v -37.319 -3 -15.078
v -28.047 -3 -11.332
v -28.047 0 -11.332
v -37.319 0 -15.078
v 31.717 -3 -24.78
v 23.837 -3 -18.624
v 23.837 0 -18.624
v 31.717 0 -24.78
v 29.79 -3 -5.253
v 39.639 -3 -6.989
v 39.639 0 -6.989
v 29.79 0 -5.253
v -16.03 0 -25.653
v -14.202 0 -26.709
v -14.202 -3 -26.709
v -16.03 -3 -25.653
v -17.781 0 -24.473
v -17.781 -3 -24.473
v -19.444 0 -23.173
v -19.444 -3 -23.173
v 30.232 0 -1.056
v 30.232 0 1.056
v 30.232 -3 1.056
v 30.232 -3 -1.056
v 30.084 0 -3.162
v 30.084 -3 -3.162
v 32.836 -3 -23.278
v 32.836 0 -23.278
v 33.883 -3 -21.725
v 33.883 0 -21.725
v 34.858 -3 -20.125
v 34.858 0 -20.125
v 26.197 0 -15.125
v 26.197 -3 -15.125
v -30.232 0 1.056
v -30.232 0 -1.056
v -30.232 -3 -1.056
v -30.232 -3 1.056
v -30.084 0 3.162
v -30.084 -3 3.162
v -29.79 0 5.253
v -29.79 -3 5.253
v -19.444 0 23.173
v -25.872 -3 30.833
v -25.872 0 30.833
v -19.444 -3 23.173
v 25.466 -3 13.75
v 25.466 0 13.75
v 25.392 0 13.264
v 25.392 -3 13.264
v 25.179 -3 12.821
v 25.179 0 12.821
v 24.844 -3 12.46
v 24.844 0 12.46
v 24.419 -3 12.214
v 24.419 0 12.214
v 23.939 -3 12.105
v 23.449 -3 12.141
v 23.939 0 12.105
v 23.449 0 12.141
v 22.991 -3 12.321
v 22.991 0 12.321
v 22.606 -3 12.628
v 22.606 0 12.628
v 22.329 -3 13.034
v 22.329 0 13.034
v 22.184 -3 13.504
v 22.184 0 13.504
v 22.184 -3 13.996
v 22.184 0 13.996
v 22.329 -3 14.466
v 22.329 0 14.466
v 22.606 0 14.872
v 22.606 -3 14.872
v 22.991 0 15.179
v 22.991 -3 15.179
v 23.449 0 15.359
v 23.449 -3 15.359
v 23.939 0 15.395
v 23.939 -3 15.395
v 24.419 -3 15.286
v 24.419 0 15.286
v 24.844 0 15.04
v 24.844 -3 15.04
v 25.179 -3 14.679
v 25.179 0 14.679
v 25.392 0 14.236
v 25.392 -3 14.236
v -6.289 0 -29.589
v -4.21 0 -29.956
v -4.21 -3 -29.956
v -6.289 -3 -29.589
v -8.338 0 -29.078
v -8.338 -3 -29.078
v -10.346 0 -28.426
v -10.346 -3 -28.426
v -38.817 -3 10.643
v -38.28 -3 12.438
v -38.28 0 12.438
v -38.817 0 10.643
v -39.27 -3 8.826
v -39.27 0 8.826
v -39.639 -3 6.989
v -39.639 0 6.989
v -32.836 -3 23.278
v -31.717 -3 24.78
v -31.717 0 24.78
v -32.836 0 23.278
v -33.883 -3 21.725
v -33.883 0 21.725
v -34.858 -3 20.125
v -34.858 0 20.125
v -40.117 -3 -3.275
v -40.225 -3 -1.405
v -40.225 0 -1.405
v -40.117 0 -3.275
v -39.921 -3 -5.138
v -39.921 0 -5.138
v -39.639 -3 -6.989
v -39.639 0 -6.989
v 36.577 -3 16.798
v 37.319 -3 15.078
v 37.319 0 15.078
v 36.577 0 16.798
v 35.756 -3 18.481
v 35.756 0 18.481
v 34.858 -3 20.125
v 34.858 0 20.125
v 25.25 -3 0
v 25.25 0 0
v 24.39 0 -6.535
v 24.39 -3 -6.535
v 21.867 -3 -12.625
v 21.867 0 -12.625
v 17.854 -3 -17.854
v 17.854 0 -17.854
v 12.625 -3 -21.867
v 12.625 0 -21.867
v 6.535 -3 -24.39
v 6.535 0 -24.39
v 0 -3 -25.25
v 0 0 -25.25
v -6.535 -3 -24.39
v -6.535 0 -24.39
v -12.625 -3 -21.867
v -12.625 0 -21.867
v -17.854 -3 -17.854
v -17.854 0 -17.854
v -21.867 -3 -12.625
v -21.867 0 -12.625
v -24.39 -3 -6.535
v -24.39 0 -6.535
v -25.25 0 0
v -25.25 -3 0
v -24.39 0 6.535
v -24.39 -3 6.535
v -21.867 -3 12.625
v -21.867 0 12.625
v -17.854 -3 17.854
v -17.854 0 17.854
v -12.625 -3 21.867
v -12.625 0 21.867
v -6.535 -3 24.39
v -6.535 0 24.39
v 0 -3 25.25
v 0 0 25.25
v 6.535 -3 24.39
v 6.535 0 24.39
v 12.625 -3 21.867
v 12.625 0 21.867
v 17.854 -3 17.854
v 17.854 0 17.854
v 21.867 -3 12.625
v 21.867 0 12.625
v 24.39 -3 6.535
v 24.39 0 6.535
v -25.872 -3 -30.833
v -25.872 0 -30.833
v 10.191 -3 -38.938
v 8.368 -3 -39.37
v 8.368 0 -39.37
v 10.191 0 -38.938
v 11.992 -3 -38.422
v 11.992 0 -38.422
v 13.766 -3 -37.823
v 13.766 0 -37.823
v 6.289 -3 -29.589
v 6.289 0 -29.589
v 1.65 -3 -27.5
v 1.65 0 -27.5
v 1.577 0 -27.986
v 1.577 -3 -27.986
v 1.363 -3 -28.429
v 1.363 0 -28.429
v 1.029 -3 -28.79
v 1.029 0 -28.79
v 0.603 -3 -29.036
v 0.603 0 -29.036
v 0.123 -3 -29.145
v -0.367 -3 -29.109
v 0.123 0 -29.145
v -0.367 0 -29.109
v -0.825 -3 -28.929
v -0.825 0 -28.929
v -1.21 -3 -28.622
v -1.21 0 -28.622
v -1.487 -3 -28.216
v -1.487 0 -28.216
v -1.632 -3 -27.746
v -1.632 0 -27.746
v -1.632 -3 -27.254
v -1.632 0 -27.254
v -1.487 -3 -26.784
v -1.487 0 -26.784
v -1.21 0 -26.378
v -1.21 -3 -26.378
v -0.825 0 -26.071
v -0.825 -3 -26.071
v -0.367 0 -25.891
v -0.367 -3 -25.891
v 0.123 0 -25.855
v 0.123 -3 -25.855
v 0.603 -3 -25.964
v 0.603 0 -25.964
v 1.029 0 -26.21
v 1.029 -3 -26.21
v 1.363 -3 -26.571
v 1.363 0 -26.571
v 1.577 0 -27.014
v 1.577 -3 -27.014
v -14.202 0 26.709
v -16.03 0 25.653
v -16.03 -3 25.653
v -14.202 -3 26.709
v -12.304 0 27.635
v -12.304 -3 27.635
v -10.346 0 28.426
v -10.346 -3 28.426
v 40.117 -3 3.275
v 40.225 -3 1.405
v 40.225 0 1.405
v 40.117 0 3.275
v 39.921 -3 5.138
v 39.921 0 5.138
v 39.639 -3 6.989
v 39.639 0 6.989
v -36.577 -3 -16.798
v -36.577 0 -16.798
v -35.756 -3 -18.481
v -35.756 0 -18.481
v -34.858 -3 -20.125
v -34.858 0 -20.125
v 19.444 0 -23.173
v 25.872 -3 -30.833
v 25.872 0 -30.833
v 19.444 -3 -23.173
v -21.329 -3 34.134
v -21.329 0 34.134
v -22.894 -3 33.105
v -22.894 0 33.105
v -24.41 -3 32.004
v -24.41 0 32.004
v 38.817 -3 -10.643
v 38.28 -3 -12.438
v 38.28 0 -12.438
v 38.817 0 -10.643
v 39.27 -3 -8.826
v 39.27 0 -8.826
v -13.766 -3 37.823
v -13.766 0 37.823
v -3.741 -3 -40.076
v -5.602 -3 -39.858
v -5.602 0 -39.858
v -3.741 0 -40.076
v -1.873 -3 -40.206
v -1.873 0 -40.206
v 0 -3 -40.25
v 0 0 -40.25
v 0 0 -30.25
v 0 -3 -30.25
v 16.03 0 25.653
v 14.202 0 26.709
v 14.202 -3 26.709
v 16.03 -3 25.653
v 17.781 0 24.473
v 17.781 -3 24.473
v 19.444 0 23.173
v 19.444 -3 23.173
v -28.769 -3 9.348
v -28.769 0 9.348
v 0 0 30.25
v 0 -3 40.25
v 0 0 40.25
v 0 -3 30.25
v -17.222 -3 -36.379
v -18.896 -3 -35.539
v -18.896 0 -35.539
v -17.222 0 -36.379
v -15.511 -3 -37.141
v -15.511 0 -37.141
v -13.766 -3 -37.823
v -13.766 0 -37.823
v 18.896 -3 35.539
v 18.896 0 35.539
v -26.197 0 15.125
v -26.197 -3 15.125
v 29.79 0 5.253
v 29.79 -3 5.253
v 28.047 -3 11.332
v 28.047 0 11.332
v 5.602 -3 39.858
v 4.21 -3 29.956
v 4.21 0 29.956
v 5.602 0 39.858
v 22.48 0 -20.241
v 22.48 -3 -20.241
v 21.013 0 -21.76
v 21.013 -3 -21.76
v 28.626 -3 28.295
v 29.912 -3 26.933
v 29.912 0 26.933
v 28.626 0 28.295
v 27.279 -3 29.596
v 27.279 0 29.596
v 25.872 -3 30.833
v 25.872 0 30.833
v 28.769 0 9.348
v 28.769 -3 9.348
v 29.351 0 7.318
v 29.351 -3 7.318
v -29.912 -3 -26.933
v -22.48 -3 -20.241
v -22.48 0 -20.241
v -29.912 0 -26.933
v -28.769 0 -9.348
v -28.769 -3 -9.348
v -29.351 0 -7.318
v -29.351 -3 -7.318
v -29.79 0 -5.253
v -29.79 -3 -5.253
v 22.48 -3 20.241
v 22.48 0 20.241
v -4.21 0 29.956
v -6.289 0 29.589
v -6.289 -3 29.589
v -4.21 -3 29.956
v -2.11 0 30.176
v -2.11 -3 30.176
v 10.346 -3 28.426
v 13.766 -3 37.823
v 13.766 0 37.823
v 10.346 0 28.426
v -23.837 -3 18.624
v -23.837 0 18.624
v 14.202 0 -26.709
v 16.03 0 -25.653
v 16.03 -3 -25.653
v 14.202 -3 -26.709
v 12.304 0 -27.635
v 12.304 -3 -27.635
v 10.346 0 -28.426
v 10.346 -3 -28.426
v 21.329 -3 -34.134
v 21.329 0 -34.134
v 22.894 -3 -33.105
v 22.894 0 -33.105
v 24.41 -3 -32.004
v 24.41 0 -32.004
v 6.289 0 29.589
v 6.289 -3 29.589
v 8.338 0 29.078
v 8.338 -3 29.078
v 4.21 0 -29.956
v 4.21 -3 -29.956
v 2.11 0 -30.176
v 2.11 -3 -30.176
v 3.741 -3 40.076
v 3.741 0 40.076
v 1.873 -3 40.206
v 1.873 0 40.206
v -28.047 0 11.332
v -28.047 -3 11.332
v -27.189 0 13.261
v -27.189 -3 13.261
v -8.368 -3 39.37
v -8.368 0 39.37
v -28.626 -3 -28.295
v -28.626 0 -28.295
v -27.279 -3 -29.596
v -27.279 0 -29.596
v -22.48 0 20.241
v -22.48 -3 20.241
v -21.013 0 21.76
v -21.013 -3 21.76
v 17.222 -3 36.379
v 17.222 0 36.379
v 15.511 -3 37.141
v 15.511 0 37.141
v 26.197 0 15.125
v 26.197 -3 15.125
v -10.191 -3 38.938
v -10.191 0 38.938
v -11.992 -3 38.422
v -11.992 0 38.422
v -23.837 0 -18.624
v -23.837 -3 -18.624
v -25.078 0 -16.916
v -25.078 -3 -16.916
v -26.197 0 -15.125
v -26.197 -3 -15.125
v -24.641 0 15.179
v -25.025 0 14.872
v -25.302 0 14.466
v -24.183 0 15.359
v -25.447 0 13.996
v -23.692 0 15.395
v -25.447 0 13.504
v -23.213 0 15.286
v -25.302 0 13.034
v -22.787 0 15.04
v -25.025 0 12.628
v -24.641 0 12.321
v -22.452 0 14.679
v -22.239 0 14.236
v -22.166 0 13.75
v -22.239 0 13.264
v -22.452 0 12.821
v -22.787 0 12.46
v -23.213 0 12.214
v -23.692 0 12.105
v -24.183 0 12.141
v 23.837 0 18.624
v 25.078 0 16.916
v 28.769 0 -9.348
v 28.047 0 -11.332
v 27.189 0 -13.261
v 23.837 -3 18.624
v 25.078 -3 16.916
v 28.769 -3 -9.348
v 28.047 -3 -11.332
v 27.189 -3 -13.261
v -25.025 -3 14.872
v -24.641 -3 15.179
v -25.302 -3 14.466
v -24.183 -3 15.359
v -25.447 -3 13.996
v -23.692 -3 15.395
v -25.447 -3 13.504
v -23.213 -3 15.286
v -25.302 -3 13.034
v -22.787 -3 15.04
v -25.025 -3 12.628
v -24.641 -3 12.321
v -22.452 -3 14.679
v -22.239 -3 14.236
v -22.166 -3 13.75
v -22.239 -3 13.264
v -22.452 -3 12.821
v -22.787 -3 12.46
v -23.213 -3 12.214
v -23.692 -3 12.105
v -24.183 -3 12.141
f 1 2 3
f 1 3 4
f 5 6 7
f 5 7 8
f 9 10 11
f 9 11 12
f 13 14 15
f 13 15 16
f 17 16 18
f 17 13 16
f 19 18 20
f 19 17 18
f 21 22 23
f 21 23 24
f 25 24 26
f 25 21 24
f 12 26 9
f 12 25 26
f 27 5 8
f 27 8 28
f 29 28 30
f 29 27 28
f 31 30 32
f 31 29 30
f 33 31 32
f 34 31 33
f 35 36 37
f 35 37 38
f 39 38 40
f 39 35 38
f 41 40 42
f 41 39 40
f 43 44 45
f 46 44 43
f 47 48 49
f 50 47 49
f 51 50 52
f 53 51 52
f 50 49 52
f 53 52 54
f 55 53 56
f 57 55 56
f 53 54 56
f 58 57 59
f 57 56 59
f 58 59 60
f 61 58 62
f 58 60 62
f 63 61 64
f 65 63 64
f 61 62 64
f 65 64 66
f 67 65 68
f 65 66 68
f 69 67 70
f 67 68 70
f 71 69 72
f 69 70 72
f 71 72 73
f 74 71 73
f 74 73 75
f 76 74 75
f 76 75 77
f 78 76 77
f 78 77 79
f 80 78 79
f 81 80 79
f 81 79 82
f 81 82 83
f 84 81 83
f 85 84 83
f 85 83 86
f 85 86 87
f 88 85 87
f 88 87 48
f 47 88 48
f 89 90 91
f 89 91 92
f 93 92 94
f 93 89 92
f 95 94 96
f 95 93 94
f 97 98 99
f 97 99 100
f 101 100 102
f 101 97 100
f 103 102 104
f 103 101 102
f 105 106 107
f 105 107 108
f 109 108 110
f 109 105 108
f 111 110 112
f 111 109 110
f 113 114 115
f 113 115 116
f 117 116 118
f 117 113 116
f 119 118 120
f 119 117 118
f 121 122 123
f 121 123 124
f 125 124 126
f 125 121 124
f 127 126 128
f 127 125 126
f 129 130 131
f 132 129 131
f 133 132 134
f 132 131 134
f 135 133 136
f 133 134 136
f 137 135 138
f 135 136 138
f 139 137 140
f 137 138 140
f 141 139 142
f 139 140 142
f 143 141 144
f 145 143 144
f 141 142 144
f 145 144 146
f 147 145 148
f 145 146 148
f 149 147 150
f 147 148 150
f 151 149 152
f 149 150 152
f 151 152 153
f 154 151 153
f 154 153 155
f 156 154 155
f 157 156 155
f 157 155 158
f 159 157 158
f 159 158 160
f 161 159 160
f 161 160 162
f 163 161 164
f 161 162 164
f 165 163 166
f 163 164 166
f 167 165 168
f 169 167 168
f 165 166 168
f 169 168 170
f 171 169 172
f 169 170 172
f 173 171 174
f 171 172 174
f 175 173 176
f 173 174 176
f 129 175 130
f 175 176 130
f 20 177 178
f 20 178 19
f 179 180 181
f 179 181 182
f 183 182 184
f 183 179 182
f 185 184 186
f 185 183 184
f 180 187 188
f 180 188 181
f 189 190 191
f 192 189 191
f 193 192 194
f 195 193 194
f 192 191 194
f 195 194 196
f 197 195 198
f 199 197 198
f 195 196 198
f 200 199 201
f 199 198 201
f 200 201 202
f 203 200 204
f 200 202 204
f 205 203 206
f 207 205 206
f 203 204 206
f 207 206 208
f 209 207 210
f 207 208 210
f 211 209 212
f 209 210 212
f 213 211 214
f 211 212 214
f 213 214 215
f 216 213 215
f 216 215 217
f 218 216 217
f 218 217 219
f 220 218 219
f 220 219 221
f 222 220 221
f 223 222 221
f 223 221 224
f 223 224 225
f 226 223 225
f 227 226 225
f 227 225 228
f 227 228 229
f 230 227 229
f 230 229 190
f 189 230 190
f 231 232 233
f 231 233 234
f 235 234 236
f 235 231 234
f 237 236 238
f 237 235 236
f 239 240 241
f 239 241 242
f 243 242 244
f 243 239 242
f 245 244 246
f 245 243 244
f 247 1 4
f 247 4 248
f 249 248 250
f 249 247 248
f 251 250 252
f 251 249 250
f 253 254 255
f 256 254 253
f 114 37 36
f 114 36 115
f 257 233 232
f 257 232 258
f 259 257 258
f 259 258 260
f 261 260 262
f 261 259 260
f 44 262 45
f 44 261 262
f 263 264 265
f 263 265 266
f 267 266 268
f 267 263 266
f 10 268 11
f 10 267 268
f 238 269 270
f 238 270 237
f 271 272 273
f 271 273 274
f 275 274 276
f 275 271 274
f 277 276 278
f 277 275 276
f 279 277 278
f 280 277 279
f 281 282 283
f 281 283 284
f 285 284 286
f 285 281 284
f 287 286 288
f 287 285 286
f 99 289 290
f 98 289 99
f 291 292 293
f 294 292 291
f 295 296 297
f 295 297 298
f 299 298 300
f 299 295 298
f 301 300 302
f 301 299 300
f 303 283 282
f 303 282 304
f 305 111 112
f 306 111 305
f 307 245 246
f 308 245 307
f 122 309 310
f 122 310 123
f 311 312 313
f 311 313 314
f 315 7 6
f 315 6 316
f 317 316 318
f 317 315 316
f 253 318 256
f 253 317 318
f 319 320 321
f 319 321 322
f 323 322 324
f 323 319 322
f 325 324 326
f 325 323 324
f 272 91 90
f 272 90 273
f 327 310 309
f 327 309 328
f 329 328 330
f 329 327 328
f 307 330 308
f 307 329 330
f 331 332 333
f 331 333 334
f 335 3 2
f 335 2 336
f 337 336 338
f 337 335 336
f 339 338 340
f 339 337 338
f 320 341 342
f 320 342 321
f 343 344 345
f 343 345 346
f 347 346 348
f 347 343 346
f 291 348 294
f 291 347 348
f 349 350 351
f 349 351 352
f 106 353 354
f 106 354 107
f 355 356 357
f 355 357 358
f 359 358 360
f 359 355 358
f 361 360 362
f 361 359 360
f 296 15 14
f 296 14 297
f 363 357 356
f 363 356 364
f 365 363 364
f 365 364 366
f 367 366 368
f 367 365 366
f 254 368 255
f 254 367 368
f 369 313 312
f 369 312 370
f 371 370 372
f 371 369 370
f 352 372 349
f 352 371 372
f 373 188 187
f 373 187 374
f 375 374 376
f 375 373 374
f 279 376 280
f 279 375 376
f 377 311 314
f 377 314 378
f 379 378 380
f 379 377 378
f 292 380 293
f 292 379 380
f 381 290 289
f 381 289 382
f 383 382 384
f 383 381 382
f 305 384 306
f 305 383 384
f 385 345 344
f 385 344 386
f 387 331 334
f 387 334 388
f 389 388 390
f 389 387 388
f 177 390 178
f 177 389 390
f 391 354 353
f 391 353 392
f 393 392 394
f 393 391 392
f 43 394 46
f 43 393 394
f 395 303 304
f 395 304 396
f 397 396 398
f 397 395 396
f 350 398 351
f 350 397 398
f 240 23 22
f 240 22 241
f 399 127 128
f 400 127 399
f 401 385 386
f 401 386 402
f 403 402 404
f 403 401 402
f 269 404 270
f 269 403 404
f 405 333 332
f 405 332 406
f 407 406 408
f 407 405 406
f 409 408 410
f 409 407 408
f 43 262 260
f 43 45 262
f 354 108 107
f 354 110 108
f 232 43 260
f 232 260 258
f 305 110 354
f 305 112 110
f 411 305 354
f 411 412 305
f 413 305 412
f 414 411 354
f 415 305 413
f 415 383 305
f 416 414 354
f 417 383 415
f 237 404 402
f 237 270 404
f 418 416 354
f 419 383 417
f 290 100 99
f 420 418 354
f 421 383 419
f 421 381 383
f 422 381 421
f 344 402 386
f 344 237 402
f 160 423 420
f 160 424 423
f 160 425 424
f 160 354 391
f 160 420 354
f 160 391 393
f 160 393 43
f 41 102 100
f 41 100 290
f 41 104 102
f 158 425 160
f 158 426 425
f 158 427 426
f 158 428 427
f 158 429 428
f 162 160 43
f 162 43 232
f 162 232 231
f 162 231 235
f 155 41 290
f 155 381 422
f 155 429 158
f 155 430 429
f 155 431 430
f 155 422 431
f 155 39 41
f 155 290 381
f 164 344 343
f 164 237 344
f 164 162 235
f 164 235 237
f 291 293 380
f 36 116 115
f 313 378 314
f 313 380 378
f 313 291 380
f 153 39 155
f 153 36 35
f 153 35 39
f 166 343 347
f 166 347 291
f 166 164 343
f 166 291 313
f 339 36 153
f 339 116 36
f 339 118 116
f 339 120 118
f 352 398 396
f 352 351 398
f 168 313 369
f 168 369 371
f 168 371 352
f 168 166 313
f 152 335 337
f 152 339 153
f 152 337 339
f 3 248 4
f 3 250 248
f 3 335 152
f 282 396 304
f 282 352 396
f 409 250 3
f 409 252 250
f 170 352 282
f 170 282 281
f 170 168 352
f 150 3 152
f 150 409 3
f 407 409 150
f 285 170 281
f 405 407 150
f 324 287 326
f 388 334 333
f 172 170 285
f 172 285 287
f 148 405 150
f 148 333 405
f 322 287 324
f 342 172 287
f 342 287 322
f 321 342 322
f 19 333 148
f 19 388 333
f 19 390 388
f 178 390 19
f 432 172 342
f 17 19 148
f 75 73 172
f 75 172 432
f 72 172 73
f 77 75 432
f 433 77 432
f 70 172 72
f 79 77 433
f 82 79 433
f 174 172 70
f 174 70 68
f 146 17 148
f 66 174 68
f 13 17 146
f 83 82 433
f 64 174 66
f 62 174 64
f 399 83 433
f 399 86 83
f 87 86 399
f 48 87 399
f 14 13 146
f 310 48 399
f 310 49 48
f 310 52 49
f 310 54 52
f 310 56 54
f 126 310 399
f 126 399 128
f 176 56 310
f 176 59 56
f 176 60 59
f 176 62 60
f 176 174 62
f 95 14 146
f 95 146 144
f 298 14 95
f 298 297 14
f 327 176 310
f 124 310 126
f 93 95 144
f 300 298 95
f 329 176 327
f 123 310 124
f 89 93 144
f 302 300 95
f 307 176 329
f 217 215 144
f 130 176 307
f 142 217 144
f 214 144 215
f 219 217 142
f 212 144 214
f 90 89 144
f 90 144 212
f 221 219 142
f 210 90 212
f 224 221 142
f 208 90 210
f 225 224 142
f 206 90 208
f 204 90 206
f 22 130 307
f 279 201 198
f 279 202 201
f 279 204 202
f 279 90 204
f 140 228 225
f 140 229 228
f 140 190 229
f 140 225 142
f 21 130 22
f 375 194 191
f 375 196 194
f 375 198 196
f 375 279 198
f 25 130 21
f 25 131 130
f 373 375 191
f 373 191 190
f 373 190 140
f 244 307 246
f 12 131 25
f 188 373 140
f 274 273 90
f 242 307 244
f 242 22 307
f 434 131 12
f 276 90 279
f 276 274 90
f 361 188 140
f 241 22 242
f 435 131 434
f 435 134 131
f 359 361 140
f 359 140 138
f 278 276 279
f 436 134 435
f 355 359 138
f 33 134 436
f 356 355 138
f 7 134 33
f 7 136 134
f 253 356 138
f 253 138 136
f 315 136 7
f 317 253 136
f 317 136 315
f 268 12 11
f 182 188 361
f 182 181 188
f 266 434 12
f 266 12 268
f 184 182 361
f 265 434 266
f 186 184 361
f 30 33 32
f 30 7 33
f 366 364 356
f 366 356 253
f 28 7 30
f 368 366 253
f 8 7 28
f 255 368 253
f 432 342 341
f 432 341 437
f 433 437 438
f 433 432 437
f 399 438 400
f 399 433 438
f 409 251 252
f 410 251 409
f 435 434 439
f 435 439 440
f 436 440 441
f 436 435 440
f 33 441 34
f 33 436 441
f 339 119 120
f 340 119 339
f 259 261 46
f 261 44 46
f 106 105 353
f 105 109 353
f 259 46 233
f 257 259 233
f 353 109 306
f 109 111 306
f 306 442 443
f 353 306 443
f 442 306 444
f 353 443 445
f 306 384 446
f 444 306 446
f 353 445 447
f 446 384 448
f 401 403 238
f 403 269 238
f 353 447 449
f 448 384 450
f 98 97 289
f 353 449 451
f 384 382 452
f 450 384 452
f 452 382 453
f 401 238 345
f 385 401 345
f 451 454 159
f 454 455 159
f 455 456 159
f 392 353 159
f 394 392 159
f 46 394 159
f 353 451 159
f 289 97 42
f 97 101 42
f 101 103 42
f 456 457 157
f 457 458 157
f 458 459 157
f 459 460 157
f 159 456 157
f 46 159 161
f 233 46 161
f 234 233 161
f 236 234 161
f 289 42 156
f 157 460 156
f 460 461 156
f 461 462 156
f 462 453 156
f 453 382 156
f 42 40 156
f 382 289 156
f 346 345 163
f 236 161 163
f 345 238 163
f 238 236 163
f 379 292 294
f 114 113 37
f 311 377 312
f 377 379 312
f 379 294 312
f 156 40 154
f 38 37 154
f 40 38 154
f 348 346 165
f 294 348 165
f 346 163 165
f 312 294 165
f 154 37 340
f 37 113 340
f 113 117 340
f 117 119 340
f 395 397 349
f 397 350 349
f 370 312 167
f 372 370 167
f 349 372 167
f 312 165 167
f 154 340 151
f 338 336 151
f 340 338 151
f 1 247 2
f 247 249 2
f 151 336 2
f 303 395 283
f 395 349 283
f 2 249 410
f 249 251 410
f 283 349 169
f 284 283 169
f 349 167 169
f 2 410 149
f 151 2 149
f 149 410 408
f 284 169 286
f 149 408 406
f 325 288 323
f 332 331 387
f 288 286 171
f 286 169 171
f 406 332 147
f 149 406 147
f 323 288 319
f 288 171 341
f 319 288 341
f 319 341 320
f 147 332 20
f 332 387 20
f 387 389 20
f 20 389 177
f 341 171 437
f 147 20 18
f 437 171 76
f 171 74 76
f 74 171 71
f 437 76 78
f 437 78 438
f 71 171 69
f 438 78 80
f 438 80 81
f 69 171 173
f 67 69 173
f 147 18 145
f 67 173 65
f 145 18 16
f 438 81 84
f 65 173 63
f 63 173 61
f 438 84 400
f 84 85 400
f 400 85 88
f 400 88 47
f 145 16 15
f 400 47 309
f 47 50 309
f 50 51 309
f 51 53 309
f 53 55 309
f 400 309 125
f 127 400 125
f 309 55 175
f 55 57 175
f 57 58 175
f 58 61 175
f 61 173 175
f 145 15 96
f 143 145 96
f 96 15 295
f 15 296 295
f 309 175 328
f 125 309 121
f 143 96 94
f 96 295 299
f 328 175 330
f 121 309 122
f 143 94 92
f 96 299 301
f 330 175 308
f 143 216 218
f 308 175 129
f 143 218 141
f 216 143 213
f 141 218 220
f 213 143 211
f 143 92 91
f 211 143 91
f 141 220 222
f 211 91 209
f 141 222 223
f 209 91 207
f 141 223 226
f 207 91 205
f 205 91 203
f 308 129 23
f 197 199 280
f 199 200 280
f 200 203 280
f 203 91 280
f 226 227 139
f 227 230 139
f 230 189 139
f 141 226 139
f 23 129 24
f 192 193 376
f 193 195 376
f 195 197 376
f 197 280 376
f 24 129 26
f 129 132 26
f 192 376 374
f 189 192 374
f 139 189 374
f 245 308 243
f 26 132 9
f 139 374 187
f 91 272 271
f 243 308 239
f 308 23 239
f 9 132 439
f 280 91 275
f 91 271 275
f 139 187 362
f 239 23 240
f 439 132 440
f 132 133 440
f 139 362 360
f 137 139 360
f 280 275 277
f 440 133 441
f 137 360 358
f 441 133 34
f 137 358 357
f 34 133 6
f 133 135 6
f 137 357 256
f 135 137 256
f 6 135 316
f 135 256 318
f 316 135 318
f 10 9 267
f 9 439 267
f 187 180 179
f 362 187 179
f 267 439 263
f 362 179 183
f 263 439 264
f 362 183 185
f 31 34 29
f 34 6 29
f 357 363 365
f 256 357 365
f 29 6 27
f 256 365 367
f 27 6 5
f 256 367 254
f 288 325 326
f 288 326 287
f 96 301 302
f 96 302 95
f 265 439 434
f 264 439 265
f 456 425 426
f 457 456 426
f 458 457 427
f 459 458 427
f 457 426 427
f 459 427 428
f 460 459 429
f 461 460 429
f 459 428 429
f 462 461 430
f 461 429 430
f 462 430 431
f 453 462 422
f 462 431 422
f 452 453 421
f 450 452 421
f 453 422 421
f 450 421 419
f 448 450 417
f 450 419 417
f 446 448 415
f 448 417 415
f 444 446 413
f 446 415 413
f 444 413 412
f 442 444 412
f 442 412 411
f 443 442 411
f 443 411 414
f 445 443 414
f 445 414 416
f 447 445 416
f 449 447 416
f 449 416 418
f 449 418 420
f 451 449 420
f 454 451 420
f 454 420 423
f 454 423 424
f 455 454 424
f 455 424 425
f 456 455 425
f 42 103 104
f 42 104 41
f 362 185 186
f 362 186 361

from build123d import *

# Parameters (mm, degrees)
SKETCH1_R           = 30.25
SKETCH1_R_2         = 25.25
EXTRUDE_THIN1_DEPTH = 3
SKETCH2_R           = 1.65
CUT_EXTRUDE3_DEPTH  = 10
BOSS_EXTRUDE1_DEPTH = 3


with BuildPart() as part:
    # Sketch1 → Extrude-Thin1 (new body)
    with BuildSketch(Plane(origin=(0, 0, 0), x_dir=(1, 0, 0), z_dir=(0, 1, 0))):
        Circle(SKETCH1_R)
        Circle(SKETCH1_R_2, mode=Mode.SUBTRACT)
    extrude(amount=-EXTRUDE_THIN1_DEPTH)

    # Sketch2 → Cut-Extrude3 (cut)
    with BuildSketch(Plane(origin=(0, 0, 0), x_dir=(1, 0, 0), z_dir=(0, 1, 0))):
        with Locations((0, 27.5)):
            Circle(SKETCH2_R)
        with Locations((23.815698604, -13.75)):
            Circle(SKETCH2_R)
        with Locations((-23.815698604, -13.75)):
            Circle(SKETCH2_R)
    extrude(amount=-CUT_EXTRUDE3_DEPTH, mode=Mode.SUBTRACT)

    # Sketch5 → Boss-Extrude1 (add)
    with BuildSketch(Plane.XZ.offset(3)):
        with BuildLine():
            Line((0, 40.25), (0, 30.25))
            ThreePointArc((0, 30.25), (2.110133331, 30.17631252), (4.209986304, 29.955609079))
            Line((4.209986304, 29.955609079), (5.601717314, 39.858289767))
            ThreePointArc((5.601717314, 39.858289767), (2.807698068, 40.151953023), (0, 40.25))
        make_face()
        with BuildLine():
            Line((13.766310769, 37.822627987), (10.346109336, 28.425701779))
            ThreePointArc((10.346109336, 28.425701779), (12.303783453, 27.634750094), (14.201514774, 26.709164684))
            Line((14.201514774, 26.709164684), (18.896230402, 35.538640613))
            ThreePointArc((18.896230402, 35.538640613), (16.371149884, 36.77020467), (13.766310769, 37.822627987))
        make_face()
        with BuildLine():
            Line((25.87220129, 30.833288836), (19.444325193, 23.172844404))
            ThreePointArc((19.444325193, 23.172844404), (21.013415706, 21.76002896), (22.480130971, 20.241200842))
            Line((22.480130971, 20.241200842), (29.911579225, 26.932506906))
            ThreePointArc((29.911579225, 26.932506906), (27.959999411, 28.953426964), (25.87220129, 30.833288836))
        make_face()
        with BuildLine():
            Line((34.857522502, 20.125), (26.197268464, 15.125))
            ThreePointArc((26.197268464, 15.125), (27.188519901, 13.26072719), (28.047311601, 11.331849451))
            Line((28.047311601, 11.331849451), (37.319150146, 15.077915385))
            ThreePointArc((37.319150146, 15.077915385), (36.176460364, 17.644438658), (34.857522502, 20.125))
        make_face()
        with BuildLine():
            Line((39.638512059, 6.989339151), (29.790434529, 5.252857374))
            ThreePointArc((29.790434529, 5.252857374), (30.084287335, 3.161986014), (30.231572517, 1.055709775))
            Line((30.231572517, 1.055709775), (40.225480788, 1.404704742))
            ThreePointArc((40.225480788, 1.404704742), (40.029506289, 4.207270647), (39.638512059, 6.989339151))
        make_face()
        with BuildLine():
            Line((39.638512059, -6.989339151), (29.790434529, -5.252857374))
            ThreePointArc((29.790434529, -5.252857374), (29.35144572, -7.318137342), (28.769459618, -9.34776408))
            Line((28.769459618, -9.34776408), (38.280024781, -12.437934024))
            ThreePointArc((38.280024781, -12.437934024), (39.054402983, -9.737356298), (39.638512059, -6.989339151))
        make_face()
        with BuildLine():
            Line((34.857522502, -20.125), (26.197268464, -15.125))
            ThreePointArc((26.197268464, -15.125), (25.07838657, -16.91558533), (23.837325297, -18.623759629))
            Line((23.837325297, -18.623759629), (31.717432833, -24.780374382))
            ThreePointArc((31.717432833, -24.780374382), (33.368762295, -22.507514365), (34.857522502, -20.125))
        make_face()
        with BuildLine():
            Line((25.87220129, -30.833288836), (19.444325193, -23.172844404))
            ThreePointArc((19.444325193, -23.172844404), (17.780503882, -24.47276408), (16.030057743, -25.653454909))
            Line((16.030057743, -25.653454909), (21.329250385, -34.13393587))
            ThreePointArc((21.329250385, -34.13393587), (23.658356405, -32.562934024), (25.87220129, -30.833288836))
        make_face()
        with BuildLine():
            Line((13.766310769, -37.822627987), (10.346109336, -28.425701779))
            ThreePointArc((10.346109336, -28.425701779), (8.338030013, -29.078166302), (6.289328647, -29.588964922))
            Line((6.289328647, -29.588964922), (8.368445555, -39.37044093))
            ThreePointArc((8.368445555, -39.37044093), (11.094403572, -38.690783262), (13.766310769, -37.822627987))
        make_face()
        with BuildLine():
            Line((0, -40.25), (0, -30.25))
            ThreePointArc((0, -30.25), (-2.110133331, -30.17631252), (-4.209986304, -29.955609079))
            Line((-4.209986304, -29.955609079), (-5.601717314, -39.858289767))
            ThreePointArc((-5.601717314, -39.858289767), (-2.807698068, -40.151953023), (0, -40.25))
        make_face()
        with BuildLine():
            Line((-13.766310769, -37.822627987), (-10.346109336, -28.425701779))
            ThreePointArc((-10.346109336, -28.425701779), (-12.303783453, -27.634750094), (-14.201514774, -26.709164684))
            Line((-14.201514774, -26.709164684), (-18.896230402, -35.538640613))
            ThreePointArc((-18.896230402, -35.538640613), (-16.371149884, -36.77020467), (-13.766310769, -37.822627987))
        make_face()
        with BuildLine():
            Line((-25.87220129, -30.833288836), (-19.444325193, -23.172844404))
            ThreePointArc((-19.444325193, -23.172844404), (-21.013415706, -21.76002896), (-22.480130971, -20.241200842))
            Line((-22.480130971, -20.241200842), (-29.911579225, -26.932506906))
            ThreePointArc((-29.911579225, -26.932506906), (-27.959999411, -28.953426964), (-25.87220129, -30.833288836))
        make_face()
        with BuildLine():
            Line((-34.857522502, -20.125), (-26.197268464, -15.125))
            ThreePointArc((-26.197268464, -15.125), (-27.188519901, -13.26072719), (-28.047311601, -11.331849451))
            Line((-28.047311601, -11.331849451), (-37.319150146, -15.077915385))
            ThreePointArc((-37.319150146, -15.077915385), (-36.176460364, -17.644438658), (-34.857522502, -20.125))
        make_face()
        with BuildLine():
            Line((-39.638512059, -6.989339151), (-29.790434529, -5.252857374))
            ThreePointArc((-29.790434529, -5.252857374), (-30.084287335, -3.161986014), (-30.231572517, -1.055709775))
            Line((-30.231572517, -1.055709775), (-40.225480788, -1.404704742))
            ThreePointArc((-40.225480788, -1.404704742), (-40.029506289, -4.207270647), (-39.638512059, -6.989339151))
        make_face()
        with BuildLine():
            Line((-39.638512059, 6.989339151), (-29.790434529, 5.252857374))
            ThreePointArc((-29.790434529, 5.252857374), (-29.35144572, 7.318137342), (-28.769459618, 9.34776408))
            Line((-28.769459618, 9.34776408), (-38.280024781, 12.437934024))
            ThreePointArc((-38.280024781, 12.437934024), (-39.054402983, 9.737356298), (-39.638512059, 6.989339151))
        make_face()
        with BuildLine():
            Line((-34.857522502, 20.125), (-26.197268464, 15.125))
            ThreePointArc((-26.197268464, 15.125), (-25.07838657, 16.91558533), (-23.837325297, 18.623759629))
            Line((-23.837325297, 18.623759629), (-31.717432833, 24.780374382))
            ThreePointArc((-31.717432833, 24.780374382), (-33.368762295, 22.507514365), (-34.857522502, 20.125))
        make_face()
        with BuildLine():
            Line((-25.87220129, 30.833288836), (-19.444325193, 23.172844404))
            ThreePointArc((-19.444325193, 23.172844404), (-17.780503882, 24.47276408), (-16.030057743, 25.653454909))
            Line((-16.030057743, 25.653454909), (-21.329250385, 34.13393587))
            ThreePointArc((-21.329250385, 34.13393587), (-23.658356405, 32.562934024), (-25.87220129, 30.833288836))
        make_face()
        with BuildLine():
            Line((-13.766310769, 37.822627987), (-10.346109336, 28.425701779))
            ThreePointArc((-10.346109336, 28.425701779), (-8.338030013, 29.078166302), (-6.289328647, 29.588964922))
            Line((-6.289328647, 29.588964922), (-8.368445555, 39.37044093))
            ThreePointArc((-8.368445555, 39.37044093), (-11.094403572, 38.690783262), (-13.766310769, 37.822627987))
        make_face()
    extrude(amount=-BOSS_EXTRUDE1_DEPTH)


solid = part.part
